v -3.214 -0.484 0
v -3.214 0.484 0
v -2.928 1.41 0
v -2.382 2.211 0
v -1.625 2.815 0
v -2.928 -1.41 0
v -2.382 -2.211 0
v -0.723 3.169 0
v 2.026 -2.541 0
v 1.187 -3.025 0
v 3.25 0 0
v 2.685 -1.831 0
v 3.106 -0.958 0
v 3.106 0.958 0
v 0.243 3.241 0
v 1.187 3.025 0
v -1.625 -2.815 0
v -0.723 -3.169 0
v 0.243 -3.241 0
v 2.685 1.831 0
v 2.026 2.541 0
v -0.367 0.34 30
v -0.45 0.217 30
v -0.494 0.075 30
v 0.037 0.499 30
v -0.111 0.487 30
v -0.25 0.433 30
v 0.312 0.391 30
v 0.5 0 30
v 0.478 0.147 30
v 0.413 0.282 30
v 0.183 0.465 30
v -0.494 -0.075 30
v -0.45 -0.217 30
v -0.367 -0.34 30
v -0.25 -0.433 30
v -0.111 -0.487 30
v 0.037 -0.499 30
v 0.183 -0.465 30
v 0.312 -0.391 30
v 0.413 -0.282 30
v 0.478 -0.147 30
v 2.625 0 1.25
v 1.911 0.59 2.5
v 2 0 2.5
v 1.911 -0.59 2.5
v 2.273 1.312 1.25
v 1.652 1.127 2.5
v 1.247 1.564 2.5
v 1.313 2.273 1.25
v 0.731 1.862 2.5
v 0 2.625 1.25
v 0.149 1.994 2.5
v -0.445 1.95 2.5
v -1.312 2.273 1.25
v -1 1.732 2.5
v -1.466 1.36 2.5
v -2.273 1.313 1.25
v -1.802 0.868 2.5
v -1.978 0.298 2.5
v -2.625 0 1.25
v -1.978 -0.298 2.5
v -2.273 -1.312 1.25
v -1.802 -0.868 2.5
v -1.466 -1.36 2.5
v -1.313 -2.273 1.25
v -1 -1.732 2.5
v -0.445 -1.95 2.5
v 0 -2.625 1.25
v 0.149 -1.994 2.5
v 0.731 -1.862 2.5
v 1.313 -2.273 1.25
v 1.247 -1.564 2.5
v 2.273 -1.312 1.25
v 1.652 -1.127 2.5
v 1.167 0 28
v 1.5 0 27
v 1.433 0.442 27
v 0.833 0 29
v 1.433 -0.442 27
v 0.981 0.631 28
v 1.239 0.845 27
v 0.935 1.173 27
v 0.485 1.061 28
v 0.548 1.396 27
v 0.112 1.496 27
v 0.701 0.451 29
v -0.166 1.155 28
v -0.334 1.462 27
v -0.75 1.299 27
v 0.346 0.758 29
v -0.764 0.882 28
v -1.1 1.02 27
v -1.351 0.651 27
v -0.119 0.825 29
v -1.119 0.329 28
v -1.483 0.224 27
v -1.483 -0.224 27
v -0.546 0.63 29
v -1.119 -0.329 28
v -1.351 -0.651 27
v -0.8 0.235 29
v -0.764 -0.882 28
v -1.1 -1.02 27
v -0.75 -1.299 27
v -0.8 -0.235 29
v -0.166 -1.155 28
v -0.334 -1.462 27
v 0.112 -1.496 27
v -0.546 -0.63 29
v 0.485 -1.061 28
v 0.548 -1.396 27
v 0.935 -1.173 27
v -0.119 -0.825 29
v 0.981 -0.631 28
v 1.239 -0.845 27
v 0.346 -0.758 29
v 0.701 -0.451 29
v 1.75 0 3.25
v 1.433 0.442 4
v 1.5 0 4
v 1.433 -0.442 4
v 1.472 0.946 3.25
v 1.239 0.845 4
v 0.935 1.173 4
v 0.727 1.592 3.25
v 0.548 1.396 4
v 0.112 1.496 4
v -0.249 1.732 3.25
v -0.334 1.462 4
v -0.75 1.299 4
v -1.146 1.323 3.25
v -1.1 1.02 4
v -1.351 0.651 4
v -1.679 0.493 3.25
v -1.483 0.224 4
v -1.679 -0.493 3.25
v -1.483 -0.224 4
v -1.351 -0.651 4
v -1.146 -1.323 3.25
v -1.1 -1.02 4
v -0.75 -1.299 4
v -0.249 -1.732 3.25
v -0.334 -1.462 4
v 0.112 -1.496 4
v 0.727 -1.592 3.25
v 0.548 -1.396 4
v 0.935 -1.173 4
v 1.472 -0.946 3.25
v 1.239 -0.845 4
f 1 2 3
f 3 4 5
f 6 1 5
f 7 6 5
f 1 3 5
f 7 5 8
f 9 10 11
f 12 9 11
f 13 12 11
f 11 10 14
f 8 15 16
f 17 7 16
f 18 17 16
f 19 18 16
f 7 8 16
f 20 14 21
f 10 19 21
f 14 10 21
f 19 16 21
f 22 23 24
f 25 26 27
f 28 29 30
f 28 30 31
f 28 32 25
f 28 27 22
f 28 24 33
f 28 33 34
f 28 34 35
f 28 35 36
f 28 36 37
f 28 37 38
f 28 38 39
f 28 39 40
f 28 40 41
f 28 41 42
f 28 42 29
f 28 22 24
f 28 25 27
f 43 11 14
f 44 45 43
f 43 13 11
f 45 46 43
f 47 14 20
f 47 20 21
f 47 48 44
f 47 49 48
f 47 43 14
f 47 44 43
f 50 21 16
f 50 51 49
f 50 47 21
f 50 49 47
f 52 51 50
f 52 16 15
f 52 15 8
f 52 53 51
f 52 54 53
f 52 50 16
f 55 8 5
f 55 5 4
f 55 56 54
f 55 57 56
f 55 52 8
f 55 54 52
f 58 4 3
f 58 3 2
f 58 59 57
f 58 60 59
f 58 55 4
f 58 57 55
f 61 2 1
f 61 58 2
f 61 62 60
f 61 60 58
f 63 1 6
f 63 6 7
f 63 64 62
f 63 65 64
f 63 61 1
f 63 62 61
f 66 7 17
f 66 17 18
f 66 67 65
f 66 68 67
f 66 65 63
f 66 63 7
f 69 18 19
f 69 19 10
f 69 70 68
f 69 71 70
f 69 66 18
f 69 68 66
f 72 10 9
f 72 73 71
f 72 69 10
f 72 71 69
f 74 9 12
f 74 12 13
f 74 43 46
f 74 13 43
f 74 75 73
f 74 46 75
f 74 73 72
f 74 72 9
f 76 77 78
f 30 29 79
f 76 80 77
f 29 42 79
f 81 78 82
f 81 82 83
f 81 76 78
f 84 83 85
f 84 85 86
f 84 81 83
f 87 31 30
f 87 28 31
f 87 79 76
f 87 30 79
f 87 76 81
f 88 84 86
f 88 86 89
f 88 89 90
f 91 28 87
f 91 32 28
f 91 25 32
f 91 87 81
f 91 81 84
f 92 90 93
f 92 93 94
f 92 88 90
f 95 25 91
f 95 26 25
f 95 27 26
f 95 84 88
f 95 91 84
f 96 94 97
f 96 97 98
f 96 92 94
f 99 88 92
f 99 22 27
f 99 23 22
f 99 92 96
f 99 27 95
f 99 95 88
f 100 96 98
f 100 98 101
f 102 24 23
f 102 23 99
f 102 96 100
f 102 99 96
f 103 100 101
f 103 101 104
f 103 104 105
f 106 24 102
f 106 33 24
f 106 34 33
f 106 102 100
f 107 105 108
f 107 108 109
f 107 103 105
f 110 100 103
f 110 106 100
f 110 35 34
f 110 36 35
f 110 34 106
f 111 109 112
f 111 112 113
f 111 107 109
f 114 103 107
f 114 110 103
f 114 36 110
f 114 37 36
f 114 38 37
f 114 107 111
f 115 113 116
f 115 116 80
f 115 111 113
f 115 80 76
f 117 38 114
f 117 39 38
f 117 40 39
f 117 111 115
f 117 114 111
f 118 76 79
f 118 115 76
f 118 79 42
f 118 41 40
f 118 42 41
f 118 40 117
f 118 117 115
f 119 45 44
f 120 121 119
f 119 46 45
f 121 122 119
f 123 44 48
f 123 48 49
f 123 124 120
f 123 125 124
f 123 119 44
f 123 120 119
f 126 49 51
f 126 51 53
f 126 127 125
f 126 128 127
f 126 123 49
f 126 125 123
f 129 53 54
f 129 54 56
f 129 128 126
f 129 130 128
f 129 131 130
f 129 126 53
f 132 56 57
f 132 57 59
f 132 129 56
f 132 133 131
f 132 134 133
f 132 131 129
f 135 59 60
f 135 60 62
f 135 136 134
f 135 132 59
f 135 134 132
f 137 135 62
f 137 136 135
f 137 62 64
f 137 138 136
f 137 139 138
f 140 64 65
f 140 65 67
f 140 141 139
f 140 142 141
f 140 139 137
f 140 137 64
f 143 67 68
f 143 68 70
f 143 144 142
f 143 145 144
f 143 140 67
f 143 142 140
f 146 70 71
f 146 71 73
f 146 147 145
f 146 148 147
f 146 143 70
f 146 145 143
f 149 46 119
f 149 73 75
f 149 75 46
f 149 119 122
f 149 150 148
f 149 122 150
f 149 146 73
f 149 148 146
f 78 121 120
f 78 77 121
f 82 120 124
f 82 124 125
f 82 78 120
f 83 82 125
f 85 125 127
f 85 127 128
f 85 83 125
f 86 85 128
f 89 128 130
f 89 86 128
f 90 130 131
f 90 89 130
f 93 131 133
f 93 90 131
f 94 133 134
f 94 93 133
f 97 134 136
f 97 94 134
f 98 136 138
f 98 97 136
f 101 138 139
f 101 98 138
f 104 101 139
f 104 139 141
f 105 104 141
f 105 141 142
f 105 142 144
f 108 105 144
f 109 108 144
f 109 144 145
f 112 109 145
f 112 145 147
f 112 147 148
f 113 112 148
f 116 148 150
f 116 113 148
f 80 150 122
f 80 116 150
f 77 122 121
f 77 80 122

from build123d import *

# Parameters (mm, degrees)
SKETCH001_R = 2
SKETCH002_R = 1.5
SKETCH003_R = 1.5
SKETCH004_R = 0.5
SKETCH_R    = 3.25


with BuildPart() as loft001:
    # Sketch001 → Loft001 section 0
    with BuildSketch(Plane.XY.offset(2.5)):
        Circle(SKETCH001_R)
    # Sketch002 → Loft001 section 1
    with BuildSketch(Plane.XY.offset(4)):
        Circle(SKETCH002_R)
    loft()


with BuildPart() as loft002:
    # Sketch002 → Loft002 section 0
    with BuildSketch(Plane.XY.offset(4)):
        Circle(SKETCH002_R)
    # Sketch003 → Loft002 section 1
    with BuildSketch(Plane.XY.offset(27)):
        Circle(SKETCH003_R)
    loft()


with BuildPart() as loft003:
    # Sketch003 → Loft003 section 0
    with BuildSketch(Plane.XY.offset(27)):
        Circle(SKETCH003_R)
    # Sketch004 → Loft003 section 1
    with BuildSketch(Plane.XY.offset(30)):
        Circle(SKETCH004_R)
    loft()


with BuildPart() as fusion:
    # Sketch → Loft section 0
    with BuildSketch(Plane.XY):
        Circle(SKETCH_R)
    # Sketch001 → Loft section 1
    with BuildSketch(Plane.XY.offset(2.5)):
        Circle(SKETCH001_R)
    loft()

    # Fusion: union Loft001, Loft002, Loft003
    add(loft001.part)
    add(loft002.part)
    add(loft003.part)


solid = fusion.part
